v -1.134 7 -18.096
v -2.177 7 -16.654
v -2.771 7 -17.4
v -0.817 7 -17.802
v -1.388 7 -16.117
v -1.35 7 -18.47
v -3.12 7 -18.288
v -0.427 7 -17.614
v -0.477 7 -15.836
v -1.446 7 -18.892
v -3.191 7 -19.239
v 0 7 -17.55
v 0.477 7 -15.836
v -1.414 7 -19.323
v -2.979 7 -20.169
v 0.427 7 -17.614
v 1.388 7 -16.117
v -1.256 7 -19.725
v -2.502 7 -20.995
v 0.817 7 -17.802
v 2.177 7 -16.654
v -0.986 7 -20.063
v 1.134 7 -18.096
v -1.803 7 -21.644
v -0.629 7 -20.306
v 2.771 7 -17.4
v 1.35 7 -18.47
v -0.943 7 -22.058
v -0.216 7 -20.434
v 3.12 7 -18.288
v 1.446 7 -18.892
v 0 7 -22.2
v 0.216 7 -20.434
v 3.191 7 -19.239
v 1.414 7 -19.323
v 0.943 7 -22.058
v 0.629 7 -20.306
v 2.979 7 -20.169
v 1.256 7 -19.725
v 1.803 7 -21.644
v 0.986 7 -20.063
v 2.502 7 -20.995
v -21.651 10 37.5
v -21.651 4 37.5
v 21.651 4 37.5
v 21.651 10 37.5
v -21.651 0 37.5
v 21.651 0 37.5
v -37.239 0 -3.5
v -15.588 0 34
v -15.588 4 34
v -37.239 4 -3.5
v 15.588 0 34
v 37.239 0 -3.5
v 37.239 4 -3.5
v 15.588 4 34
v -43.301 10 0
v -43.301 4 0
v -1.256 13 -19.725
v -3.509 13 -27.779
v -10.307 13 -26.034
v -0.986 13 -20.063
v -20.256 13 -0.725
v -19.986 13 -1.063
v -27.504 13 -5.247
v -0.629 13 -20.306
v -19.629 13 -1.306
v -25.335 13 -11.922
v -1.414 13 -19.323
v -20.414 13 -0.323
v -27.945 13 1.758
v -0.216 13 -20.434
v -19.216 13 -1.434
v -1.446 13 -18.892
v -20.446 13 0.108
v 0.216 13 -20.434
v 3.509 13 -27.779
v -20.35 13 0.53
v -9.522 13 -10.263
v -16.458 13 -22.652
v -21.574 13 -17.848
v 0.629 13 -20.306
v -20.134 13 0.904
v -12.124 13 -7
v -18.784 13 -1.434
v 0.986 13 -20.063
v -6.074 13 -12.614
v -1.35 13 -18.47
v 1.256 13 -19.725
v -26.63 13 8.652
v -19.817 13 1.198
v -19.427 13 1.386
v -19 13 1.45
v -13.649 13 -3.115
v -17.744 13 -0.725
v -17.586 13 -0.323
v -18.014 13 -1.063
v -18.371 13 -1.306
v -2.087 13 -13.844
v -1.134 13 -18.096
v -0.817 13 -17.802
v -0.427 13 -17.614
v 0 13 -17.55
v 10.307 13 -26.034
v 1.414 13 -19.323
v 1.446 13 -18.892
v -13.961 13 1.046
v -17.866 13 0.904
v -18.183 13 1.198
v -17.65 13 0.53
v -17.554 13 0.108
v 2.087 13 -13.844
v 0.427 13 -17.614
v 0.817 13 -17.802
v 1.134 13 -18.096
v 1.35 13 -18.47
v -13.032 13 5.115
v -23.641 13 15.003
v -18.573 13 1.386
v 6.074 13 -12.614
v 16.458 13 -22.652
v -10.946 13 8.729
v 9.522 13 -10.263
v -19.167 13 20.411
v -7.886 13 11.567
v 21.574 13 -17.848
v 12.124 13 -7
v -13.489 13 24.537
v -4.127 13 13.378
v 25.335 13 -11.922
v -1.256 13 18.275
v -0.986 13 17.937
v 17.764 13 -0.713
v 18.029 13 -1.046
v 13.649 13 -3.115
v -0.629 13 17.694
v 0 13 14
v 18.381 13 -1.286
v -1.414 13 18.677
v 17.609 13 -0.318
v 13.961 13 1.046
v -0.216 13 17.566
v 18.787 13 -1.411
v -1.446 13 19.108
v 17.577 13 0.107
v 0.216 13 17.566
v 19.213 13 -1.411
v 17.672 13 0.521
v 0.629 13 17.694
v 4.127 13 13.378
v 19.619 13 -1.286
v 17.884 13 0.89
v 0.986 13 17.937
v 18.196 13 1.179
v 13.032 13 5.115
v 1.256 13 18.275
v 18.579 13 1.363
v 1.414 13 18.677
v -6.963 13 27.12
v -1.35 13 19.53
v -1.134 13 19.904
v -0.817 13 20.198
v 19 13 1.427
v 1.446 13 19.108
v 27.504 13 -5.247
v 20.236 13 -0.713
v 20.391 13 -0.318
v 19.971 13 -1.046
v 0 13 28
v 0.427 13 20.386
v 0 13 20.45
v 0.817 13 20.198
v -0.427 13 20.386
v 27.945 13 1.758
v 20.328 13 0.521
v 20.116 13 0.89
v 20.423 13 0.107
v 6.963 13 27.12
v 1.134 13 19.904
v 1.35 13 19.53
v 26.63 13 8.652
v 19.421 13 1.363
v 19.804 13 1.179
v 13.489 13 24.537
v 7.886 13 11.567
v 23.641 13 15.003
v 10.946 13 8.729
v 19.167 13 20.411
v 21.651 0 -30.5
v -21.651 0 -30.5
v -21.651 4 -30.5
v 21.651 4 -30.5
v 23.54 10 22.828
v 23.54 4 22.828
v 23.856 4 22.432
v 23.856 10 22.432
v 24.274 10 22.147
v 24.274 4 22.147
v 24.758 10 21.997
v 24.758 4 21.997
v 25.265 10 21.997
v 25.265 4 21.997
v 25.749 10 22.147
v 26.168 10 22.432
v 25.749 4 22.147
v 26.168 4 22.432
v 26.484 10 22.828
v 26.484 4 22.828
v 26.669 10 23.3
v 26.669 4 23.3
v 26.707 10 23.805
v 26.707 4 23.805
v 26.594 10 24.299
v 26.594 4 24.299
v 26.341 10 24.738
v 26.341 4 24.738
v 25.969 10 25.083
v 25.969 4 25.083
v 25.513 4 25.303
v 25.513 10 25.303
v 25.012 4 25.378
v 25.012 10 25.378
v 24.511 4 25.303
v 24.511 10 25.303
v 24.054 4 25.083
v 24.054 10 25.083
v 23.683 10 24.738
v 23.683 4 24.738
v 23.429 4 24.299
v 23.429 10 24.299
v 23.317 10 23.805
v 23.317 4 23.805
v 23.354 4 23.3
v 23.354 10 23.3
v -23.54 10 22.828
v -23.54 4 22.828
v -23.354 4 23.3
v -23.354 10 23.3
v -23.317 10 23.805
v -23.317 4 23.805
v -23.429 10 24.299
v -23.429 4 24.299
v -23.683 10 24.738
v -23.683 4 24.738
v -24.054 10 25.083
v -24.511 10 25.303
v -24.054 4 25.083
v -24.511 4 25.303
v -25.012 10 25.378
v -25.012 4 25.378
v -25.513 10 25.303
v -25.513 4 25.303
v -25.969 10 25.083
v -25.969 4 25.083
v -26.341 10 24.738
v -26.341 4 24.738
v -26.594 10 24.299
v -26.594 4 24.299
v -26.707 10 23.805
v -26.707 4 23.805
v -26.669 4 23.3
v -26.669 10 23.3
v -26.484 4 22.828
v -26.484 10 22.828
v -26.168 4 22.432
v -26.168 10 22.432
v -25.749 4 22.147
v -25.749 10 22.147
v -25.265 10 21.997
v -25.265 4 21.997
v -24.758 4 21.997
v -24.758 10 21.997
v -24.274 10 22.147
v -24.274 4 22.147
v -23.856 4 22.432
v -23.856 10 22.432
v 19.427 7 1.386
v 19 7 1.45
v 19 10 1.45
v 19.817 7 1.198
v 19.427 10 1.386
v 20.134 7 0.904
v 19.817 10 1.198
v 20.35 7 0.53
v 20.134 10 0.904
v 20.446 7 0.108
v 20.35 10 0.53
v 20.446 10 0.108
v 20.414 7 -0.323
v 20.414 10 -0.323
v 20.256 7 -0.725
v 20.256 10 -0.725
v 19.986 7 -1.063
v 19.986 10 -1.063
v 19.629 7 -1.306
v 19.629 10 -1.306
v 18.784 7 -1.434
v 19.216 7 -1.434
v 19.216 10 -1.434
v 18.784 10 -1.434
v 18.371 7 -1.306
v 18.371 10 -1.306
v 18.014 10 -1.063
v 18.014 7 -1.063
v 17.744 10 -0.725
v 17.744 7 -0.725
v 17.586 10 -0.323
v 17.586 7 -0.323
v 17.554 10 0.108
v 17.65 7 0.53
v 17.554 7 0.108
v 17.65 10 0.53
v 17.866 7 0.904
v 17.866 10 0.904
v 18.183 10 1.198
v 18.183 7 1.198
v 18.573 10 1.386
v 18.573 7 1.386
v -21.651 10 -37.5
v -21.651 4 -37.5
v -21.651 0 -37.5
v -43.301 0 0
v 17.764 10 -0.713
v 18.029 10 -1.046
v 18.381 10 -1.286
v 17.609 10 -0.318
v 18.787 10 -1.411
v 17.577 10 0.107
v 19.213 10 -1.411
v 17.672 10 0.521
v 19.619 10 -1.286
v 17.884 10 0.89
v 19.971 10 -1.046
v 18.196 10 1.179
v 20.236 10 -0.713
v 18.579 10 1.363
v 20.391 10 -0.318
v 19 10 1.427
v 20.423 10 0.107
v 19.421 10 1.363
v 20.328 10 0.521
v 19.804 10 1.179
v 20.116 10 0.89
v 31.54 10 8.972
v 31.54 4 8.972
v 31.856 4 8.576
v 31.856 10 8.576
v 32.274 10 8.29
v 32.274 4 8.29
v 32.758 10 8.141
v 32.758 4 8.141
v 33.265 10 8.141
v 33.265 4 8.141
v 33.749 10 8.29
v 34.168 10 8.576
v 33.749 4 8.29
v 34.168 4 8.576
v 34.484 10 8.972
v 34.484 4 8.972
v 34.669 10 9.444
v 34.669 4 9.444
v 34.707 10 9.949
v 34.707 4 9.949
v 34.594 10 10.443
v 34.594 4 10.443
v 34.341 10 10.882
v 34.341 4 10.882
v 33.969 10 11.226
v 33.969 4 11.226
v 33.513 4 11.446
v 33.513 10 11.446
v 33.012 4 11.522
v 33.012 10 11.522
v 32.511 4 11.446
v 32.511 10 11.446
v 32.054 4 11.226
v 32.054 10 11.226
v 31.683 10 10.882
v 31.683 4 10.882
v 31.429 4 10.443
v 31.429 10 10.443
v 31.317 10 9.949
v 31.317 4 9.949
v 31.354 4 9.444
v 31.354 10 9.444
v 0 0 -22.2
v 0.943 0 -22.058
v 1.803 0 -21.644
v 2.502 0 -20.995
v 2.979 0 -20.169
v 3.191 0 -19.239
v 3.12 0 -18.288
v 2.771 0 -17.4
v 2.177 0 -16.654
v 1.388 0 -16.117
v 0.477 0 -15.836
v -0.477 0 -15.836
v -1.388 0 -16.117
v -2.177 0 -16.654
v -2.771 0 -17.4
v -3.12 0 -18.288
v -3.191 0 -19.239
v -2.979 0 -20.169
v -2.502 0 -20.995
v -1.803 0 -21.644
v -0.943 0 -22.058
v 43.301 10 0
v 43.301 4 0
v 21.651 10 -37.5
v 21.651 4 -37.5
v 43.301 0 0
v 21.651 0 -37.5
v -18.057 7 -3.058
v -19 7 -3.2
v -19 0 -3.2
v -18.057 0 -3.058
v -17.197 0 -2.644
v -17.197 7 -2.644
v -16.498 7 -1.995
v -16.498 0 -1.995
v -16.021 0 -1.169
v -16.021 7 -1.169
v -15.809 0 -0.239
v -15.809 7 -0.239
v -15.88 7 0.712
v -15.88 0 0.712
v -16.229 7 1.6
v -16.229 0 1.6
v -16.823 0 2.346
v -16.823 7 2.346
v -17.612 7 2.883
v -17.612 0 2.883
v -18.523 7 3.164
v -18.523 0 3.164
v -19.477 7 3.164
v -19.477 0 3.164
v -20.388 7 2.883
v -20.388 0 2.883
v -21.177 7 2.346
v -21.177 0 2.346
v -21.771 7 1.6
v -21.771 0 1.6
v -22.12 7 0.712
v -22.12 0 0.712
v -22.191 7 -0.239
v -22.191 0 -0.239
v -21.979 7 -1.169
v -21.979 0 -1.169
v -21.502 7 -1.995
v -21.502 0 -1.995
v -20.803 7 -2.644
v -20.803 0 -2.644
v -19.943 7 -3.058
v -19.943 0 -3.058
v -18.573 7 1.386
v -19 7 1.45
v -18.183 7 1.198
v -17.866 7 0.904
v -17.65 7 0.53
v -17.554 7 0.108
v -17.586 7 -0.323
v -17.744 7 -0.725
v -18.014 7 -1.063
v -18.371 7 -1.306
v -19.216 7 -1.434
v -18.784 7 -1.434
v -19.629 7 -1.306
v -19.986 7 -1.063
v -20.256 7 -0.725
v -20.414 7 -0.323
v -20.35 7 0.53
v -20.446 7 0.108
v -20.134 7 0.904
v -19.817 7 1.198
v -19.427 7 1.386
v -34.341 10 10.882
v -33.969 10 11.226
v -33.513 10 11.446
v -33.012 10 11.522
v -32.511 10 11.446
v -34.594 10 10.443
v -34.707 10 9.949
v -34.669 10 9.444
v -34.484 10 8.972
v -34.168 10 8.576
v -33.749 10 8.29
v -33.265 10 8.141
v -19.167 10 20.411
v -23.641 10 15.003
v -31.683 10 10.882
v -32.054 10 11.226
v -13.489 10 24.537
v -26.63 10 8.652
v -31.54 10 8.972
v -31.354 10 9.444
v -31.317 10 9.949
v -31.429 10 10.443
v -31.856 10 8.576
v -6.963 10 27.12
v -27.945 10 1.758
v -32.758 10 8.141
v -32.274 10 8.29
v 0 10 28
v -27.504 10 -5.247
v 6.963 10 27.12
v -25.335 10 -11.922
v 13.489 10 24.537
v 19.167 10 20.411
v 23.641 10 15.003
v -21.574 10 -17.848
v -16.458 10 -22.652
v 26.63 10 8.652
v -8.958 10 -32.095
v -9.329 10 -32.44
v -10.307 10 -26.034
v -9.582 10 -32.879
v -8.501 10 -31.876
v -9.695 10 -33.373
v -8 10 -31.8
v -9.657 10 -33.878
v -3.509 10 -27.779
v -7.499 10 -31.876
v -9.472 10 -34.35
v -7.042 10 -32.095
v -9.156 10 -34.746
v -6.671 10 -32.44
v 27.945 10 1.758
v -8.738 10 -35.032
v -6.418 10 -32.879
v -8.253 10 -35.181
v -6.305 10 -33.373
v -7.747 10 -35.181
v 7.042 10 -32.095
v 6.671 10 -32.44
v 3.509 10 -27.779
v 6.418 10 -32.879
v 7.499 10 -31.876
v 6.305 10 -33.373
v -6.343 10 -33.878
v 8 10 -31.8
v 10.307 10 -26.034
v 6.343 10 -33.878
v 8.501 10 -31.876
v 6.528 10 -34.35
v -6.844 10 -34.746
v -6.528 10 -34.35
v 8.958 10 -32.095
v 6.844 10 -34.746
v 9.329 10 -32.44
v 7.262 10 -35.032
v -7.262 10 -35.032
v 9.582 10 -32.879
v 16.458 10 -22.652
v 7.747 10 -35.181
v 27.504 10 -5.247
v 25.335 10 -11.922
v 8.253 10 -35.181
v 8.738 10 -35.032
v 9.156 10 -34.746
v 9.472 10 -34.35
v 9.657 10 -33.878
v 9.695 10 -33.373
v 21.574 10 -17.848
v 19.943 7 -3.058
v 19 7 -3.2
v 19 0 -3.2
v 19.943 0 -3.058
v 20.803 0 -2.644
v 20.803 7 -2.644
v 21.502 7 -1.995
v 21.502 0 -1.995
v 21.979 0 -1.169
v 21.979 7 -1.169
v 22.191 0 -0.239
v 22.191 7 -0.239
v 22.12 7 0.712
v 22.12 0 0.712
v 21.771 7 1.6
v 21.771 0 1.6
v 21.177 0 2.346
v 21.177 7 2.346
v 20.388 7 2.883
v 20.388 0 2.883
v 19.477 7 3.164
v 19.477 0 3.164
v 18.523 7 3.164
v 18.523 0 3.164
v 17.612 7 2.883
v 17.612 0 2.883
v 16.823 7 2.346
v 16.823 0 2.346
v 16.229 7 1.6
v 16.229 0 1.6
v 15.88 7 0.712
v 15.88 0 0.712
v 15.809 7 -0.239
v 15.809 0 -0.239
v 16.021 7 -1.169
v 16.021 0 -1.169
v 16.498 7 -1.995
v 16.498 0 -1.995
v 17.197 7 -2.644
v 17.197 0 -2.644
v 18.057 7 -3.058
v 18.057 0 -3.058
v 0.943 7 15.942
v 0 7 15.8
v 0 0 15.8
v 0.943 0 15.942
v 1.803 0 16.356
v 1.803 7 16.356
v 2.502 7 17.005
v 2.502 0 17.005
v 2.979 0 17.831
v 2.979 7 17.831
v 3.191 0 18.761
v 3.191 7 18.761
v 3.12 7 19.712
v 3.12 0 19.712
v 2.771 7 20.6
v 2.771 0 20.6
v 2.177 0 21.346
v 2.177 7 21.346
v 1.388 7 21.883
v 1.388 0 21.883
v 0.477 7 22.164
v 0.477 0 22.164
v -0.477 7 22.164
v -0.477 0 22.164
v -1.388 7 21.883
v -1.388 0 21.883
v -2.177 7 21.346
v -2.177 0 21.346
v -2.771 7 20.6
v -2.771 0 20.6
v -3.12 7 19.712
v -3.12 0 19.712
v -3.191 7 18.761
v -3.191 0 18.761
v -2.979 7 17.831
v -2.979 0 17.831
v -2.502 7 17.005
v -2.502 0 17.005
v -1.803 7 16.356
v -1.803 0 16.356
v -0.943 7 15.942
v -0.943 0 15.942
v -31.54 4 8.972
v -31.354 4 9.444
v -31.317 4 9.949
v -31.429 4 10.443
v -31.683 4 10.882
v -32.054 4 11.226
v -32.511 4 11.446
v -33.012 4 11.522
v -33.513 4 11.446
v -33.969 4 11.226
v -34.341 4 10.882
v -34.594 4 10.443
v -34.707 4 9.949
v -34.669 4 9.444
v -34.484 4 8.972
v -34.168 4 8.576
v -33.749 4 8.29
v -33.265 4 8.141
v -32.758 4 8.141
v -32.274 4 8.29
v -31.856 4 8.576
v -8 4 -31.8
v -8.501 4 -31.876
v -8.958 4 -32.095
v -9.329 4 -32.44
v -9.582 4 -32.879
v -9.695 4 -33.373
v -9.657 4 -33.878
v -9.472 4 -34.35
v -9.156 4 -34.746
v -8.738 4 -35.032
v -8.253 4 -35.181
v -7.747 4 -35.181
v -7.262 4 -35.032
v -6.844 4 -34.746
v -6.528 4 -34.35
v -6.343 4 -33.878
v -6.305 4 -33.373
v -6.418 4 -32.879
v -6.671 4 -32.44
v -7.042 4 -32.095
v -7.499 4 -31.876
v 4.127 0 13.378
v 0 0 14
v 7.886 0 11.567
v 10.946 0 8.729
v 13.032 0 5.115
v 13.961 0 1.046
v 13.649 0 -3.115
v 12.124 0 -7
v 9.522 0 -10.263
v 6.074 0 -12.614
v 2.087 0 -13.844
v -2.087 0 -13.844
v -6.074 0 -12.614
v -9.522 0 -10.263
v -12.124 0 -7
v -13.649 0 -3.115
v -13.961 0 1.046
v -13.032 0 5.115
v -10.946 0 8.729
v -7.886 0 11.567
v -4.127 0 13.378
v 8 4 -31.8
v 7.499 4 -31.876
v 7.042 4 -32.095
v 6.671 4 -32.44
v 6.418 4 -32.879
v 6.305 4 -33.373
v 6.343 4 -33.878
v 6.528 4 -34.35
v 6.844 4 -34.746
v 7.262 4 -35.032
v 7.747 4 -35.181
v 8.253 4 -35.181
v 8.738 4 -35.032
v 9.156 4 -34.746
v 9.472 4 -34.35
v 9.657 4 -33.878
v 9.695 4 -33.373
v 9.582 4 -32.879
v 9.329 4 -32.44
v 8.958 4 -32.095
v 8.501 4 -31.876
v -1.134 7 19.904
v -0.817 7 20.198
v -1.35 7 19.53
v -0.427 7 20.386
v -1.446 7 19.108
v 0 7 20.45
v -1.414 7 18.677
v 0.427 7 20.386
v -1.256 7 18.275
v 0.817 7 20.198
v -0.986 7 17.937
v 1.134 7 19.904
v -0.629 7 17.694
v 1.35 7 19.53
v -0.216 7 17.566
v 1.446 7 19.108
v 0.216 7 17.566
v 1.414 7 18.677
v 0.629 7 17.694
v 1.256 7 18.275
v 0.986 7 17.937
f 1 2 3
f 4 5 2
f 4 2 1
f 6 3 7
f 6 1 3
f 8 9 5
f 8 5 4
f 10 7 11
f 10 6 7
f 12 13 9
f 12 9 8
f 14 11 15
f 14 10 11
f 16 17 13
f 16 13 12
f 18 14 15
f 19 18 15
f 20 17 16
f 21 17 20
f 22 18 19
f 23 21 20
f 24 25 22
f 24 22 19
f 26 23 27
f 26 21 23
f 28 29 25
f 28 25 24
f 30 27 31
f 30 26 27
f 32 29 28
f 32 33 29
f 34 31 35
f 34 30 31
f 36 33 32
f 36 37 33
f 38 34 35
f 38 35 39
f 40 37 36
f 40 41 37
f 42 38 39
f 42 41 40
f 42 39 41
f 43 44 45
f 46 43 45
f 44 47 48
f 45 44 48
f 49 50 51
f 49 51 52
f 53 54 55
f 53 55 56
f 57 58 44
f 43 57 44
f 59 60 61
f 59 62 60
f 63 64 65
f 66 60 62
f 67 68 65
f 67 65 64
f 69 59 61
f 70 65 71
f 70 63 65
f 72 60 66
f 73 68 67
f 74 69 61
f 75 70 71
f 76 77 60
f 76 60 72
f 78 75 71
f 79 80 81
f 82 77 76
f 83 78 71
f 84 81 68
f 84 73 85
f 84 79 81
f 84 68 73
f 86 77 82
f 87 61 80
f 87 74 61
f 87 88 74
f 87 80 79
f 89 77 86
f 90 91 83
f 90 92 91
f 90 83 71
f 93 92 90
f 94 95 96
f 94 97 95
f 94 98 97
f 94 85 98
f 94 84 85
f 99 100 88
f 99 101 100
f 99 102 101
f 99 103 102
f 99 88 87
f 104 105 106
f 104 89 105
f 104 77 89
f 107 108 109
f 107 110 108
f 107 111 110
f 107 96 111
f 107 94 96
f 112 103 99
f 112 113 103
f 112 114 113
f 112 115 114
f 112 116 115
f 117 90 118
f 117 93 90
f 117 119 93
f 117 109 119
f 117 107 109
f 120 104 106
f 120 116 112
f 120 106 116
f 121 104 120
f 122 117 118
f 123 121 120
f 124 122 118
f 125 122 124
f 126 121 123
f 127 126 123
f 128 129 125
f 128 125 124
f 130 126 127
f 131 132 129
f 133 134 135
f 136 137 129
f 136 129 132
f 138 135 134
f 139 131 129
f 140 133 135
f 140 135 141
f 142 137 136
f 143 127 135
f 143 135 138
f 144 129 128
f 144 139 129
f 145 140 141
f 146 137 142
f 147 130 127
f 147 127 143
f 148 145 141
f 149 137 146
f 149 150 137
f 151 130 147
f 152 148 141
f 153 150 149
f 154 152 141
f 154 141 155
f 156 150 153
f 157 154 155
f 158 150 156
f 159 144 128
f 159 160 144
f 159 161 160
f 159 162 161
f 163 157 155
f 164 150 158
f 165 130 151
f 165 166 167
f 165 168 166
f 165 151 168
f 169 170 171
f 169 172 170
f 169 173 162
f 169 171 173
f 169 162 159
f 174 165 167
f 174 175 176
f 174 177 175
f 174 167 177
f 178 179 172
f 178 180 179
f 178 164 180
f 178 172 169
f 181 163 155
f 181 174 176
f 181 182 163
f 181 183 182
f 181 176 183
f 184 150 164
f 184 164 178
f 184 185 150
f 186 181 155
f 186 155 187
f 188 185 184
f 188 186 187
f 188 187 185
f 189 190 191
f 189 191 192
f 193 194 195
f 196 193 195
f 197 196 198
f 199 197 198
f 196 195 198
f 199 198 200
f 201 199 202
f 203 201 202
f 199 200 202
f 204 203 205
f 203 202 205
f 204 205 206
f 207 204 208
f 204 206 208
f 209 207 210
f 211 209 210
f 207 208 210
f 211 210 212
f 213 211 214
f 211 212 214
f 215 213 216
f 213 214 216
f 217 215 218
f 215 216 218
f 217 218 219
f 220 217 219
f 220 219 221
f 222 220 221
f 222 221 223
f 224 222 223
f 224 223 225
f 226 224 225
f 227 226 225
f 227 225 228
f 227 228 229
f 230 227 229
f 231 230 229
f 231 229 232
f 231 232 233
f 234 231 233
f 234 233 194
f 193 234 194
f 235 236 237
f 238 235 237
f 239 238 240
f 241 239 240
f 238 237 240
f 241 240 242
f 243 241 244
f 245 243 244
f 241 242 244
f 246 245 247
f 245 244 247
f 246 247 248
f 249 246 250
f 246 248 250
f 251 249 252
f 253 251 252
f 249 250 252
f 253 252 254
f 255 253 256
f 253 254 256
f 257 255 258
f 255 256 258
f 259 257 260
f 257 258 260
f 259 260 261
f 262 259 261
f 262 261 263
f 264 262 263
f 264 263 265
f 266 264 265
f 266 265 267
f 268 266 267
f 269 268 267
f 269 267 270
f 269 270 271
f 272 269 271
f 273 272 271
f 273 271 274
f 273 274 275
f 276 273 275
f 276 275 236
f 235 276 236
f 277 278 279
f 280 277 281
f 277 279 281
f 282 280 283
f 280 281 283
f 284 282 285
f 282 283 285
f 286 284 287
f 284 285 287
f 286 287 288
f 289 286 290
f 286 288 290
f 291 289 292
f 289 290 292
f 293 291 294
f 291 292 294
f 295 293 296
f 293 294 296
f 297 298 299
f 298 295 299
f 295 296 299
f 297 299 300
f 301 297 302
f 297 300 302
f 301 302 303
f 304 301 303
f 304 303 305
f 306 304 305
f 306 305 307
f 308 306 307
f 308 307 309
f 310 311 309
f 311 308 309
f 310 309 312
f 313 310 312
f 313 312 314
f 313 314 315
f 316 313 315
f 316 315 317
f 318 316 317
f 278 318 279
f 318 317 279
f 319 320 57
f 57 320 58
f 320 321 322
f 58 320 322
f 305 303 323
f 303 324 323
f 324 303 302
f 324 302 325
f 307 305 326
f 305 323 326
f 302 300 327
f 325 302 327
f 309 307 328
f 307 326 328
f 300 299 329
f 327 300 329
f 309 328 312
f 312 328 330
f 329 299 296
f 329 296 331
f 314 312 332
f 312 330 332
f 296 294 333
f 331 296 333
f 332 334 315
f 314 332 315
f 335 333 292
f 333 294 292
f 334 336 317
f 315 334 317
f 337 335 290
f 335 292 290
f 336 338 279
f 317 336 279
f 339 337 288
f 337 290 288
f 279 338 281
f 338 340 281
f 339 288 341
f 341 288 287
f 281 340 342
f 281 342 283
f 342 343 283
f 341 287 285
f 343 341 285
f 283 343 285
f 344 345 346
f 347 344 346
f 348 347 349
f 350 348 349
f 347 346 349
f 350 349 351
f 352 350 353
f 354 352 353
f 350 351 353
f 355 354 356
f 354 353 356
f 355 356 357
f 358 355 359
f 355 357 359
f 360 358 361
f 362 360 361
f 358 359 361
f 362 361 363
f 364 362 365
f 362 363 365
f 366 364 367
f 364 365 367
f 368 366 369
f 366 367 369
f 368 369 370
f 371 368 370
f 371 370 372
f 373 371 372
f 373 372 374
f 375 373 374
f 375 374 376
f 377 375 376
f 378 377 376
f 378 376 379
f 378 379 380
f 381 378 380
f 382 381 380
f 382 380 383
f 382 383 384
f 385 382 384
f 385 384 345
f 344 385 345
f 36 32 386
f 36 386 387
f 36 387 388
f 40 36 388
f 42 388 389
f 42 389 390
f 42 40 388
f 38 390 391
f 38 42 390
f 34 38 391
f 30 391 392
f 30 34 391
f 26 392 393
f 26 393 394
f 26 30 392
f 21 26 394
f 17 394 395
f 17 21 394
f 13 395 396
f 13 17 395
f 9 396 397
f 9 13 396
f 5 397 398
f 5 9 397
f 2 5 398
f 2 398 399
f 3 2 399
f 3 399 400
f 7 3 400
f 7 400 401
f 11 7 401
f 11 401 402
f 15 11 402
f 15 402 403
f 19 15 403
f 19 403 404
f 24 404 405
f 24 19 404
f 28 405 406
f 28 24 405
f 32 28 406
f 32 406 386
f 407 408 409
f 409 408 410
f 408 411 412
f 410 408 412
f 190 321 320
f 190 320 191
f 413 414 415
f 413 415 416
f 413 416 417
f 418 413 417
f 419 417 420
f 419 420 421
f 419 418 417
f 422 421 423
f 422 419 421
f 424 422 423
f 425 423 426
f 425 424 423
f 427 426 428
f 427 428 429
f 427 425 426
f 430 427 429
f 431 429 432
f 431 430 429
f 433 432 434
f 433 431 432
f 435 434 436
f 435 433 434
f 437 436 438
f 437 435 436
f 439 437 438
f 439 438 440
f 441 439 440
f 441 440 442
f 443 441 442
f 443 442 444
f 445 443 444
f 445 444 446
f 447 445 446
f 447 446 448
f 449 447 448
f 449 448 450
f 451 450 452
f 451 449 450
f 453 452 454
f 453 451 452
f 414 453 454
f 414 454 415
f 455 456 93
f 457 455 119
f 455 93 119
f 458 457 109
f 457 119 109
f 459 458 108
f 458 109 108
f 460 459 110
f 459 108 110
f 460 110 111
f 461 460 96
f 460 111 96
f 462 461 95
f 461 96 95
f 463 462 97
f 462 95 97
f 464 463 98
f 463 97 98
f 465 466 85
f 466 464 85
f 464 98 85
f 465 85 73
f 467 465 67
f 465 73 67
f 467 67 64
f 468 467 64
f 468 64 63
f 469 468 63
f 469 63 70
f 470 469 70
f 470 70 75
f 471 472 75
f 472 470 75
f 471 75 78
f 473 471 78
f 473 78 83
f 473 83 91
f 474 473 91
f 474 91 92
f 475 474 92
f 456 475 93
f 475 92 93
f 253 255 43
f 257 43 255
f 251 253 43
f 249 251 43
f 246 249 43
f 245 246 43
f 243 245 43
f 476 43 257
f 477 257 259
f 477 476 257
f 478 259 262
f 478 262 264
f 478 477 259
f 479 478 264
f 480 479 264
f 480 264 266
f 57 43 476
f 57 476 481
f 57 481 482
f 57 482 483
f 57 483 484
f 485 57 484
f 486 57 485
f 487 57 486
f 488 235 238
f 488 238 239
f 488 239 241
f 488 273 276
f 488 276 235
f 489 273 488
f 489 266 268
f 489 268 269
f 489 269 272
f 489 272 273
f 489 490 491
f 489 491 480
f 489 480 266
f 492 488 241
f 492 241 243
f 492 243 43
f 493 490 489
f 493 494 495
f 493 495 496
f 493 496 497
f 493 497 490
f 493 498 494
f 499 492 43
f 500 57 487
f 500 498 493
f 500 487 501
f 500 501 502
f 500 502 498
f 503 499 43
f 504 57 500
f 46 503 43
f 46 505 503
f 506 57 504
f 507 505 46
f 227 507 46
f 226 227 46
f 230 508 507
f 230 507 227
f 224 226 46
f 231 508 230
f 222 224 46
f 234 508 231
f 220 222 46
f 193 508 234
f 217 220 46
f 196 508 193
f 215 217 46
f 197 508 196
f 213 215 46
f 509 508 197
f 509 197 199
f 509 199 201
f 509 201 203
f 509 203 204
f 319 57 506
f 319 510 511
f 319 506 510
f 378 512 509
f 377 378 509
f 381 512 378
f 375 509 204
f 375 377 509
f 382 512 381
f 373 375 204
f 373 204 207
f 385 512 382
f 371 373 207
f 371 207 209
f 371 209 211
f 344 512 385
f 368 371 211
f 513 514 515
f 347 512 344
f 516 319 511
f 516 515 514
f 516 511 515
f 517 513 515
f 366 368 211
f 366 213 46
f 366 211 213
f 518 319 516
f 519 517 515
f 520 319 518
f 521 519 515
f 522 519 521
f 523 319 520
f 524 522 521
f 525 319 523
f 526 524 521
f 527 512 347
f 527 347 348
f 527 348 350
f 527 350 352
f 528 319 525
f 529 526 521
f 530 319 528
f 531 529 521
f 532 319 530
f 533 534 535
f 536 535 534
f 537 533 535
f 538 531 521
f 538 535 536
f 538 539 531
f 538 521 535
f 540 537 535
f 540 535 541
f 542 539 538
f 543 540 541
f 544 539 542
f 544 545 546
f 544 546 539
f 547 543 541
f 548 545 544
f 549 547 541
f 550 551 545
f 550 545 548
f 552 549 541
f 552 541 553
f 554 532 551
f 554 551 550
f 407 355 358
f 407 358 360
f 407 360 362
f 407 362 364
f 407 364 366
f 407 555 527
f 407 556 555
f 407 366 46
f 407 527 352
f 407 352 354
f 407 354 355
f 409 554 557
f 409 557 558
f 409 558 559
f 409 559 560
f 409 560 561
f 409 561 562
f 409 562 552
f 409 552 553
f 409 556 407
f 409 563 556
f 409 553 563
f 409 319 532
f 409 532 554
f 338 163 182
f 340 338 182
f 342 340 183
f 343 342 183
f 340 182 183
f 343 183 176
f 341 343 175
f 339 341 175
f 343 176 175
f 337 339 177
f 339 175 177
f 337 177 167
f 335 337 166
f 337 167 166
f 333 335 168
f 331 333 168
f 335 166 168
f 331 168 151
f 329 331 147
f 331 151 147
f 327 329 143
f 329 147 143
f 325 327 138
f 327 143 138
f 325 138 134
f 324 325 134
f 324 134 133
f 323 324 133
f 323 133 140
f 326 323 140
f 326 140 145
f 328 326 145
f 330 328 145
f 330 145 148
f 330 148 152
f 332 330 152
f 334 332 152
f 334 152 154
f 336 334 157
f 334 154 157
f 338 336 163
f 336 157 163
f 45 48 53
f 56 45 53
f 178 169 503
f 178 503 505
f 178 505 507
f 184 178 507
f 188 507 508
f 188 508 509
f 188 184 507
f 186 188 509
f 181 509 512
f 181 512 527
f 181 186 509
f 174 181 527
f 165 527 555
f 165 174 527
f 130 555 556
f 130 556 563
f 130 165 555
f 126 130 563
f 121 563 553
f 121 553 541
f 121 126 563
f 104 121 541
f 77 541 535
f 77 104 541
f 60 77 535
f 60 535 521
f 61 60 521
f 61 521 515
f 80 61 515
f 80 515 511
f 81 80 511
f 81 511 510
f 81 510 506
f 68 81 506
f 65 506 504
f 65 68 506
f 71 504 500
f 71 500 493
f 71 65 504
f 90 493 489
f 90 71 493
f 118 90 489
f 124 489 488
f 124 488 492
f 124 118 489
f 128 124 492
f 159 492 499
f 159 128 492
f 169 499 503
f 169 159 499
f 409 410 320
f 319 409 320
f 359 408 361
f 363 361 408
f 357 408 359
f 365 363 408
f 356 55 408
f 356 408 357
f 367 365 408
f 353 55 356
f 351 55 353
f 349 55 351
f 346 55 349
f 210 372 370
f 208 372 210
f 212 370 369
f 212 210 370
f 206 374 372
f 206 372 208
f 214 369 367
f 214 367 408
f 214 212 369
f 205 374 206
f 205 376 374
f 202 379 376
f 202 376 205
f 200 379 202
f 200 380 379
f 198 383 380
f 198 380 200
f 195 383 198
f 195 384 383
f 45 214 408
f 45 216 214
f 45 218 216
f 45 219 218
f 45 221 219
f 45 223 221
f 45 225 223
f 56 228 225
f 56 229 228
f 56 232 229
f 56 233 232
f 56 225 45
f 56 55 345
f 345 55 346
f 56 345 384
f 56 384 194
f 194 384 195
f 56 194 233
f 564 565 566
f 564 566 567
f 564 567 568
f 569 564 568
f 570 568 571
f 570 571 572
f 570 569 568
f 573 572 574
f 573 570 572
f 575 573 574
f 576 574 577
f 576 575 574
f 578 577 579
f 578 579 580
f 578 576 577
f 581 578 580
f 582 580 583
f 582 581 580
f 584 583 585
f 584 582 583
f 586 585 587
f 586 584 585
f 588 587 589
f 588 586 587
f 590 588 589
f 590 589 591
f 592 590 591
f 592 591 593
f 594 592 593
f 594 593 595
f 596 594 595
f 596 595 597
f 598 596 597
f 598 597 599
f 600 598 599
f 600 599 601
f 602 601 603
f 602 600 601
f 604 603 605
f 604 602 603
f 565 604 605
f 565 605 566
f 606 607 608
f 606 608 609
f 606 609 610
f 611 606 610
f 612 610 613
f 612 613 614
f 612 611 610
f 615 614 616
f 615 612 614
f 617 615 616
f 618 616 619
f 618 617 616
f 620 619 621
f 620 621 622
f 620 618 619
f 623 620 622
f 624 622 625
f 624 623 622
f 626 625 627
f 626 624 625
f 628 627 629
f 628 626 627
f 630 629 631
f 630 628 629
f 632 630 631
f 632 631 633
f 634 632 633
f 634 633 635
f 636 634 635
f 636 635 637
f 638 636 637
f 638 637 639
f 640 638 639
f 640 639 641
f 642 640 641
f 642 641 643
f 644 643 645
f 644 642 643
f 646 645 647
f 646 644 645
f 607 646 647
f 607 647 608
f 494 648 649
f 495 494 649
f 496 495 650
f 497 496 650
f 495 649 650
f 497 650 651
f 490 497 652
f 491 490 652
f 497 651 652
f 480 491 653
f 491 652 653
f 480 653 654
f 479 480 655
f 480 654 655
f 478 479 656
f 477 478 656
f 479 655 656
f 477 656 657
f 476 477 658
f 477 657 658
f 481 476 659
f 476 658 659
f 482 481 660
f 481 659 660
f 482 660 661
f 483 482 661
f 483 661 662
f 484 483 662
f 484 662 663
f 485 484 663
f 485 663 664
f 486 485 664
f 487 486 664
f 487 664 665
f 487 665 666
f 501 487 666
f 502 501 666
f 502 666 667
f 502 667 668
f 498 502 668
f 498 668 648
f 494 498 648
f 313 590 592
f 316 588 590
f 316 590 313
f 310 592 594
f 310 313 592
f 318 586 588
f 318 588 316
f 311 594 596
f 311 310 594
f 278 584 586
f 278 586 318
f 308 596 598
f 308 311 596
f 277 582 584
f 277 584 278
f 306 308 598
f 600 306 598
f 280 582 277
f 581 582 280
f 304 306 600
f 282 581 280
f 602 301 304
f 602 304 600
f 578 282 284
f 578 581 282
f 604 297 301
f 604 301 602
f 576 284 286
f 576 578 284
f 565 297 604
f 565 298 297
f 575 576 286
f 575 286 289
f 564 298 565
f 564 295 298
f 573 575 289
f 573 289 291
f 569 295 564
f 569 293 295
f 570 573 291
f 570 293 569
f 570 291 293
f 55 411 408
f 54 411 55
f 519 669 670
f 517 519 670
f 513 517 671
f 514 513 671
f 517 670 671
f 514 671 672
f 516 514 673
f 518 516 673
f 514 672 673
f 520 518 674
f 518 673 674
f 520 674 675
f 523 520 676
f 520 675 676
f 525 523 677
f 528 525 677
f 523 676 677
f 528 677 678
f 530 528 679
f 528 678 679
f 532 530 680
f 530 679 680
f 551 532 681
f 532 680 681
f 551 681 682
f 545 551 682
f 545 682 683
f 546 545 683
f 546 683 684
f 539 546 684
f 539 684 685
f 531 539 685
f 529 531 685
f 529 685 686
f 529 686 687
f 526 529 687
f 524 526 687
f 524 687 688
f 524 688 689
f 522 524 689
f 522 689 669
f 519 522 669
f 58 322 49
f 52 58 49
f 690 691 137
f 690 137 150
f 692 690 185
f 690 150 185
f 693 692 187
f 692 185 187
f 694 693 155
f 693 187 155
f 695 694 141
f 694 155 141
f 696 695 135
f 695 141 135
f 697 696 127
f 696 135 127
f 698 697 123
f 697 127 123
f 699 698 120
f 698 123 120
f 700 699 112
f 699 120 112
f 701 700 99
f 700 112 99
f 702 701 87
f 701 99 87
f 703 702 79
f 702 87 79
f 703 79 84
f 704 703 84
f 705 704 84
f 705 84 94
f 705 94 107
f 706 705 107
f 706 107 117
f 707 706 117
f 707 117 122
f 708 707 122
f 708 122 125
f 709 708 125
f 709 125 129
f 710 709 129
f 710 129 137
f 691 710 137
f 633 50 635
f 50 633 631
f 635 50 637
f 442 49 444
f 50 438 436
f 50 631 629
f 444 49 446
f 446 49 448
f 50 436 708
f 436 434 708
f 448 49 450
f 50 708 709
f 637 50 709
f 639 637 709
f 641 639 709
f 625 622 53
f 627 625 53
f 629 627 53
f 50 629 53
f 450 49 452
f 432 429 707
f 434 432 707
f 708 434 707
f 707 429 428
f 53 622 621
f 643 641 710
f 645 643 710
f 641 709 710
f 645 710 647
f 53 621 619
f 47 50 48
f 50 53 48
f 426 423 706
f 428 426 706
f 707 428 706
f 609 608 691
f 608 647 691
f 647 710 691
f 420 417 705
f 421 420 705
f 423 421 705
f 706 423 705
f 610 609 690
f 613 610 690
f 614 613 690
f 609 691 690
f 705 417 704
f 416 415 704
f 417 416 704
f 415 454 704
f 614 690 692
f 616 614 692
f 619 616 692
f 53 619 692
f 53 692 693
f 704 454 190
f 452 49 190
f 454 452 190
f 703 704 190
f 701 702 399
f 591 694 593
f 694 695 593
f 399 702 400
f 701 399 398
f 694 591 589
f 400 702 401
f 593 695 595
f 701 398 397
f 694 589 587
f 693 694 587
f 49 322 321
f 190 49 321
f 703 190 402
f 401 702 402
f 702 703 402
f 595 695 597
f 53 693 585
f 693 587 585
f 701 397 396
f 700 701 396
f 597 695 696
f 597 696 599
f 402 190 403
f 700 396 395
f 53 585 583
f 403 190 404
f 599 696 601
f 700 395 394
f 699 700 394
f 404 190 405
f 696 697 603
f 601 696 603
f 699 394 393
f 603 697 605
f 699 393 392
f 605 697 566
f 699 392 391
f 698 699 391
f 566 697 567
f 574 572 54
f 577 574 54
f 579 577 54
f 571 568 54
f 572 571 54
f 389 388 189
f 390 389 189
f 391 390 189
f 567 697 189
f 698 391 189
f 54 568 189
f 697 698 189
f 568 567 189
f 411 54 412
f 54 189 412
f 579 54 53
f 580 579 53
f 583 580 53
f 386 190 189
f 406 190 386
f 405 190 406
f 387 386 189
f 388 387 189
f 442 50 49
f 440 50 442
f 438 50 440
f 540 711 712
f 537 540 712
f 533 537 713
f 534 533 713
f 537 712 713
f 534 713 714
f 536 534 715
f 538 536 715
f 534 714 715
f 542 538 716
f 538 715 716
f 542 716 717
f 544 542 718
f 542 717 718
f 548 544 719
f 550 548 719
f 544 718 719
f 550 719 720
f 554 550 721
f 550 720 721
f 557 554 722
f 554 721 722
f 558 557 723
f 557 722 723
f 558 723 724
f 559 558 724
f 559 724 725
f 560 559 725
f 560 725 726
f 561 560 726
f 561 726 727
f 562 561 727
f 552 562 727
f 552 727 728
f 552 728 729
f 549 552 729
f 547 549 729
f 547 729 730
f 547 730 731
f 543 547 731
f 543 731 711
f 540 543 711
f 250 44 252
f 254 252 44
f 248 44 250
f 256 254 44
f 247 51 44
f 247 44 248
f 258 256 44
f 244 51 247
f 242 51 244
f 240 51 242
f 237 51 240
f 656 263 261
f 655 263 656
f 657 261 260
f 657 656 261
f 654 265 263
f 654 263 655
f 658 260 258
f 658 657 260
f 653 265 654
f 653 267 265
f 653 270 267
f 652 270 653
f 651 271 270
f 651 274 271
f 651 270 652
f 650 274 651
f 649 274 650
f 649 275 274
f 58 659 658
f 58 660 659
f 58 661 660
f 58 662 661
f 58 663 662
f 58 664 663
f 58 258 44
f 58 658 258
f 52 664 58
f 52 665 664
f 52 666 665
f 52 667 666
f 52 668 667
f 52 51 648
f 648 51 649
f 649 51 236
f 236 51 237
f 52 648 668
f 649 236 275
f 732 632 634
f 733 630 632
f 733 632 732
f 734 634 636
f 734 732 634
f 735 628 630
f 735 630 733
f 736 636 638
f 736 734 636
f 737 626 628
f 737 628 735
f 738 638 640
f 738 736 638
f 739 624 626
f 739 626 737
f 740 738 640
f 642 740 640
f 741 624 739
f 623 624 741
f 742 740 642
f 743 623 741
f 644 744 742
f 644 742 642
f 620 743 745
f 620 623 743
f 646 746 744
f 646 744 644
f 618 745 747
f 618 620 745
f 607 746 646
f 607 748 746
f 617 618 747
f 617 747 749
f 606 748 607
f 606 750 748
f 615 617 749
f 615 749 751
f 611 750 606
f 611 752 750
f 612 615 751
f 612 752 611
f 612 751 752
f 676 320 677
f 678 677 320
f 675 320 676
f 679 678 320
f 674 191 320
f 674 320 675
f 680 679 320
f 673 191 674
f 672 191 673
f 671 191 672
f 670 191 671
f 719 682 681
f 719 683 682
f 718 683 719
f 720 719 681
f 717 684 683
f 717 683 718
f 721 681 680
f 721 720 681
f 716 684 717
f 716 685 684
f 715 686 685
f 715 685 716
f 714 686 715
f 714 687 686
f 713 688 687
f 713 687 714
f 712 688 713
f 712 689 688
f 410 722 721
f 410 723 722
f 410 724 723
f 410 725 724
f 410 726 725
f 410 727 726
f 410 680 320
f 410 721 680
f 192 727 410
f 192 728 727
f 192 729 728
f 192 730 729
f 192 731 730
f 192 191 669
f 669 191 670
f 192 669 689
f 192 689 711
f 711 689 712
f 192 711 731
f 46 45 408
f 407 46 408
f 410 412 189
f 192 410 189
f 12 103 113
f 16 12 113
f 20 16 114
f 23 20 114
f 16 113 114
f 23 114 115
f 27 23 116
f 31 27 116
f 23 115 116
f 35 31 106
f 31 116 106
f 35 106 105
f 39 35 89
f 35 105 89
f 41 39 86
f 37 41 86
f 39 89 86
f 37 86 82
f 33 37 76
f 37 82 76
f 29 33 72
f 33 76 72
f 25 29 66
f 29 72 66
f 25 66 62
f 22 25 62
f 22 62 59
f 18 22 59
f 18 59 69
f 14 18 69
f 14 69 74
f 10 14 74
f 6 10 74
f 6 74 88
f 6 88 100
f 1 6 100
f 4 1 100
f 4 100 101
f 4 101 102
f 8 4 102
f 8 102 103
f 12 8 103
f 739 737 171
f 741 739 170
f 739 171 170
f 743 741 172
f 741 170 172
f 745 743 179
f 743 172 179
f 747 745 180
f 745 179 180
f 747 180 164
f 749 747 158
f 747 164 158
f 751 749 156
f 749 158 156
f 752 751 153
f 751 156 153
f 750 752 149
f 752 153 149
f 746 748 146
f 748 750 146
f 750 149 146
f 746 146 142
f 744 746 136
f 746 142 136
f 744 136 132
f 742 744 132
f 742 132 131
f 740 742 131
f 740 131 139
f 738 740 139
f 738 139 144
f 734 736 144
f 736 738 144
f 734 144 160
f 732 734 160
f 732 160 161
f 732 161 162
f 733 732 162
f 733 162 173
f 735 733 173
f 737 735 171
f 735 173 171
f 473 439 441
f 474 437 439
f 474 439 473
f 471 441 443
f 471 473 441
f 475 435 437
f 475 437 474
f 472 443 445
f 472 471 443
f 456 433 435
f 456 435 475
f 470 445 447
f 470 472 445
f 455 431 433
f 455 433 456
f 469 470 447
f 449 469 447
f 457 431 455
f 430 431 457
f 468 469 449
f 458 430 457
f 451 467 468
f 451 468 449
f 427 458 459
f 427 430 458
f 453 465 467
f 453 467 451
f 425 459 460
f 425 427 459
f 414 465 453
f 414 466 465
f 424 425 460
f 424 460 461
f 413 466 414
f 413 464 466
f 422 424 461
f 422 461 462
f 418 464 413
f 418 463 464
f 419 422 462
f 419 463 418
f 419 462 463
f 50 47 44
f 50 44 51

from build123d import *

# Parameters (mm, degrees)
EXTRUDE_1_DEPTH          = 10
SKETCH_2_R               = 1.45
SKETCH_2_R_2             = 14
CUT_EXTRUDE_1_DEPTH      = 10
CUT_EXTRUDE_START        = -7
SKETCH_4_R               = 3.2
SKETCH_4_R_2             = 1.45
CUT_EXTRUDE_2_DEPTH      = 7
SKETCH_4_3_W             = 43.30127019
SKETCH_4_3_H             = 7
CUT_EXTRUDE_3_DEPTH      = 4
SKETCH_4_4_R             = 1.7
CUT_EXTRUDE_4_DEPTH      = 41
EXTRUDE_START            = 3
SKETCH_5_R               = 28
SKETCH_5_R_2             = 14
SKETCH_5_R_3             = 1.426889677
SKETCH_5_R_4             = 1.45
EXTRUDE_2_DEPTH          = 3
PATTERN_CIRCULAR_1_COUNT = 3


with BuildPart() as part:
    # 草图1 → 凸台-拉伸1 (new body)
    with BuildSketch(Plane(origin=(0, 0, 0), x_dir=(1, 0, 0), z_dir=(0, 1, 0))):
        Polygon((43.301270189, 0), (21.650635095, 37.5), (-21.650635095, 37.5), (-43.301270189, 0), (-21.650635095, -37.5), (21.650635095, -37.5), align=None)
    extrude(amount=EXTRUDE_1_DEPTH)

    # 草图2 → 切除-拉伸1 (cut)
    with BuildSketch(Plane(origin=(0, 10, 0), x_dir=(1, 0, 0), z_dir=(0, 1, 0))):
        with Locations((0, 19)):
            Circle(SKETCH_2_R)
        with Locations((19, 0)):
            Circle(SKETCH_2_R)
        with Locations((0, -19)):
            Circle(SKETCH_2_R)
        with Locations((-19, 0)):
            Circle(SKETCH_2_R)
        Circle(SKETCH_2_R_2)
    extrude(amount=-CUT_EXTRUDE_1_DEPTH, mode=Mode.SUBTRACT)

    # 草图4 → 切除-拉伸2 (cut)
    # profile 1 of 4: a face of its own
    with BuildSketch(Plane.XZ.offset(CUT_EXTRUDE_START)):
        with Locations((-19, 0)):
            Circle(SKETCH_4_R)
        with Locations((-19, 0)):
            Circle(SKETCH_4_R_2, mode=Mode.SUBTRACT)
    # profile 2 of 4: a face of its own
    with BuildSketch(Plane.XZ.offset(CUT_EXTRUDE_START)):
        with Locations((0, -19)):
            Circle(SKETCH_4_R)
    # profile 3 of 4: a face of its own
    with BuildSketch(Plane.XZ.offset(CUT_EXTRUDE_START)):
        with Locations((19, 0)):
            Circle(SKETCH_4_R)
        with Locations((19, 0)):
            Circle(SKETCH_4_R_2, mode=Mode.SUBTRACT)
    # profile 4 of 4: a face of its own
    with BuildSketch(Plane.XZ.offset(CUT_EXTRUDE_START)):
        with Locations((0, 19)):
            Circle(SKETCH_4_R)
        with Locations((0, 19)):
            Circle(SKETCH_4_R_2, mode=Mode.SUBTRACT)
    extrude(amount=CUT_EXTRUDE_2_DEPTH, mode=Mode.SUBTRACT)

    # 草图4<3> → 切除-拉伸3 (cut)
    with BuildSketch(Plane.XZ):
        with Locations((0, -34)):
            Rectangle(SKETCH_4_3_W, SKETCH_4_3_H)
    cut_extrude_3 = extrude(amount=-CUT_EXTRUDE_3_DEPTH, mode=Mode.SUBTRACT)

    # 草图4<4> → 切除-拉伸4 (cut)
    with BuildSketch(Plane.XZ):
        with Locations((8, -33.5)):
            Circle(SKETCH_4_4_R)
        with Locations((-8, -33.5)):
            Circle(SKETCH_4_4_R)
    cut_extrude_4 = extrude(amount=-CUT_EXTRUDE_4_DEPTH, mode=Mode.SUBTRACT)

    # 草图5 → 凸台-拉伸2 (add)
    with BuildSketch(Plane(origin=(0, 10, 0), x_dir=(1, 0, 0), z_dir=(0, 1, 0)).offset(EXTRUDE_START)):
        Circle(SKETCH_5_R)
        Circle(SKETCH_5_R_2, mode=Mode.SUBTRACT)
        with Locations((19, 0)):
            Circle(SKETCH_5_R_3, mode=Mode.SUBTRACT)
        with Locations((0, 19)):
            Circle(SKETCH_5_R_4, mode=Mode.SUBTRACT)
        with Locations((-19, 0)):
            Circle(SKETCH_5_R_4, mode=Mode.SUBTRACT)
        with Locations((0, -19)):
            Circle(SKETCH_5_R_4, mode=Mode.SUBTRACT)
    extrude(amount=-EXTRUDE_2_DEPTH)

    # 阵列(圆周)1: 切除-拉伸3, 切除-拉伸4 ×3 about axis
    pattern_circular_1_axis = Axis((0, 0, 0), (0, 1, 0))
    add([cut_extrude_3.rotate(pattern_circular_1_axis, i * 360 / PATTERN_CIRCULAR_1_COUNT) for i in range(1, PATTERN_CIRCULAR_1_COUNT)], mode=Mode.SUBTRACT)
    add([cut_extrude_4.rotate(pattern_circular_1_axis, i * 360 / PATTERN_CIRCULAR_1_COUNT) for i in range(1, PATTERN_CIRCULAR_1_COUNT)], mode=Mode.SUBTRACT)


solid = part.part
